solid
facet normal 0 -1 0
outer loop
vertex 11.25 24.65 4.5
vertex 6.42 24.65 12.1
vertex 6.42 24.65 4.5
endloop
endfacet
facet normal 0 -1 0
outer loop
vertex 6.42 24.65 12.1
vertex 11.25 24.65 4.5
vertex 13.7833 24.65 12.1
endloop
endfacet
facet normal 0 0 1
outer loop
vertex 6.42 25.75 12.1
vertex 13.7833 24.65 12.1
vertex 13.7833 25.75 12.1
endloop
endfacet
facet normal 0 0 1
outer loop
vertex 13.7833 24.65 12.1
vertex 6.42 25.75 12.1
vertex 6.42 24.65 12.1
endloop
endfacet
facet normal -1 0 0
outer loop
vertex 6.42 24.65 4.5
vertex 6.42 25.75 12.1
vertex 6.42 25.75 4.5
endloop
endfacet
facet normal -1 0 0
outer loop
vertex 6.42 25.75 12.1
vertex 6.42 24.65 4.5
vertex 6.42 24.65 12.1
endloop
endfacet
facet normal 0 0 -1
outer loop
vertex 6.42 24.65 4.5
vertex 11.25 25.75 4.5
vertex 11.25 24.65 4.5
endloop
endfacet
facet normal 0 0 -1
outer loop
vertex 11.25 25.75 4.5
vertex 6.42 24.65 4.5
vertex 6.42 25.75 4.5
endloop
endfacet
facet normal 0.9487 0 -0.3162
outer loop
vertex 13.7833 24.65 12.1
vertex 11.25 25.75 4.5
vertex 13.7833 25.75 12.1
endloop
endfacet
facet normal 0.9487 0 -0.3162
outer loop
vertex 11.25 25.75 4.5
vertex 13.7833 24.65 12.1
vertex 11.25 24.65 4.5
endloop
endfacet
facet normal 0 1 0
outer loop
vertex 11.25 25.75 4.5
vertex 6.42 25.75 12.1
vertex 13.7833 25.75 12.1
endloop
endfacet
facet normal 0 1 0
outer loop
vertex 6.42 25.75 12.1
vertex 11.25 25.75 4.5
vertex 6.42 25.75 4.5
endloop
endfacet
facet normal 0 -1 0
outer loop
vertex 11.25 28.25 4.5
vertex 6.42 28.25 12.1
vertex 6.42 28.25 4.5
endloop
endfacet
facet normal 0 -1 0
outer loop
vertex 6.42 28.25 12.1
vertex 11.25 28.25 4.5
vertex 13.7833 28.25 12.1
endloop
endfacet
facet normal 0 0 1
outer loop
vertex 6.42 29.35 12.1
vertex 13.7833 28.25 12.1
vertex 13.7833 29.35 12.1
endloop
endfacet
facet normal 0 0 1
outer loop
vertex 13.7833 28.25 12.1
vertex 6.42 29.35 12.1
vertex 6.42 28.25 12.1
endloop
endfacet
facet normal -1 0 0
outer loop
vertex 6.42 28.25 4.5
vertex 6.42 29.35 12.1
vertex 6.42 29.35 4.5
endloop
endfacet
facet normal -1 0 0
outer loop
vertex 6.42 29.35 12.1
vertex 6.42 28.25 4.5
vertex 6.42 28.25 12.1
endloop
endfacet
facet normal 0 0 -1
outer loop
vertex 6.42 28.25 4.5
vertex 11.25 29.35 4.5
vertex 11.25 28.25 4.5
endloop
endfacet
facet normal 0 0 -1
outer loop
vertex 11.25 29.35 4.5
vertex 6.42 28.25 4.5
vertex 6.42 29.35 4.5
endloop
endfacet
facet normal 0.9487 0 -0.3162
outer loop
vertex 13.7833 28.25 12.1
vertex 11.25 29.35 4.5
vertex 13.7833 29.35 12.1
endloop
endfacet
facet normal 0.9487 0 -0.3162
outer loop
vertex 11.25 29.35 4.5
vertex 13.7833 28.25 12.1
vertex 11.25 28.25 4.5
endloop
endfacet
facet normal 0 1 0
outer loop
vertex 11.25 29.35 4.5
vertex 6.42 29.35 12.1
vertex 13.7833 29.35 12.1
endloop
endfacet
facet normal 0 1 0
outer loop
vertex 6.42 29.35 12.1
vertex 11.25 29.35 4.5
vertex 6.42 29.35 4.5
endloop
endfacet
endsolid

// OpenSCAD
use <../../../gehaeuse/hydrodesk_base.scad>
for (s=[-1,1]) keil(s);
